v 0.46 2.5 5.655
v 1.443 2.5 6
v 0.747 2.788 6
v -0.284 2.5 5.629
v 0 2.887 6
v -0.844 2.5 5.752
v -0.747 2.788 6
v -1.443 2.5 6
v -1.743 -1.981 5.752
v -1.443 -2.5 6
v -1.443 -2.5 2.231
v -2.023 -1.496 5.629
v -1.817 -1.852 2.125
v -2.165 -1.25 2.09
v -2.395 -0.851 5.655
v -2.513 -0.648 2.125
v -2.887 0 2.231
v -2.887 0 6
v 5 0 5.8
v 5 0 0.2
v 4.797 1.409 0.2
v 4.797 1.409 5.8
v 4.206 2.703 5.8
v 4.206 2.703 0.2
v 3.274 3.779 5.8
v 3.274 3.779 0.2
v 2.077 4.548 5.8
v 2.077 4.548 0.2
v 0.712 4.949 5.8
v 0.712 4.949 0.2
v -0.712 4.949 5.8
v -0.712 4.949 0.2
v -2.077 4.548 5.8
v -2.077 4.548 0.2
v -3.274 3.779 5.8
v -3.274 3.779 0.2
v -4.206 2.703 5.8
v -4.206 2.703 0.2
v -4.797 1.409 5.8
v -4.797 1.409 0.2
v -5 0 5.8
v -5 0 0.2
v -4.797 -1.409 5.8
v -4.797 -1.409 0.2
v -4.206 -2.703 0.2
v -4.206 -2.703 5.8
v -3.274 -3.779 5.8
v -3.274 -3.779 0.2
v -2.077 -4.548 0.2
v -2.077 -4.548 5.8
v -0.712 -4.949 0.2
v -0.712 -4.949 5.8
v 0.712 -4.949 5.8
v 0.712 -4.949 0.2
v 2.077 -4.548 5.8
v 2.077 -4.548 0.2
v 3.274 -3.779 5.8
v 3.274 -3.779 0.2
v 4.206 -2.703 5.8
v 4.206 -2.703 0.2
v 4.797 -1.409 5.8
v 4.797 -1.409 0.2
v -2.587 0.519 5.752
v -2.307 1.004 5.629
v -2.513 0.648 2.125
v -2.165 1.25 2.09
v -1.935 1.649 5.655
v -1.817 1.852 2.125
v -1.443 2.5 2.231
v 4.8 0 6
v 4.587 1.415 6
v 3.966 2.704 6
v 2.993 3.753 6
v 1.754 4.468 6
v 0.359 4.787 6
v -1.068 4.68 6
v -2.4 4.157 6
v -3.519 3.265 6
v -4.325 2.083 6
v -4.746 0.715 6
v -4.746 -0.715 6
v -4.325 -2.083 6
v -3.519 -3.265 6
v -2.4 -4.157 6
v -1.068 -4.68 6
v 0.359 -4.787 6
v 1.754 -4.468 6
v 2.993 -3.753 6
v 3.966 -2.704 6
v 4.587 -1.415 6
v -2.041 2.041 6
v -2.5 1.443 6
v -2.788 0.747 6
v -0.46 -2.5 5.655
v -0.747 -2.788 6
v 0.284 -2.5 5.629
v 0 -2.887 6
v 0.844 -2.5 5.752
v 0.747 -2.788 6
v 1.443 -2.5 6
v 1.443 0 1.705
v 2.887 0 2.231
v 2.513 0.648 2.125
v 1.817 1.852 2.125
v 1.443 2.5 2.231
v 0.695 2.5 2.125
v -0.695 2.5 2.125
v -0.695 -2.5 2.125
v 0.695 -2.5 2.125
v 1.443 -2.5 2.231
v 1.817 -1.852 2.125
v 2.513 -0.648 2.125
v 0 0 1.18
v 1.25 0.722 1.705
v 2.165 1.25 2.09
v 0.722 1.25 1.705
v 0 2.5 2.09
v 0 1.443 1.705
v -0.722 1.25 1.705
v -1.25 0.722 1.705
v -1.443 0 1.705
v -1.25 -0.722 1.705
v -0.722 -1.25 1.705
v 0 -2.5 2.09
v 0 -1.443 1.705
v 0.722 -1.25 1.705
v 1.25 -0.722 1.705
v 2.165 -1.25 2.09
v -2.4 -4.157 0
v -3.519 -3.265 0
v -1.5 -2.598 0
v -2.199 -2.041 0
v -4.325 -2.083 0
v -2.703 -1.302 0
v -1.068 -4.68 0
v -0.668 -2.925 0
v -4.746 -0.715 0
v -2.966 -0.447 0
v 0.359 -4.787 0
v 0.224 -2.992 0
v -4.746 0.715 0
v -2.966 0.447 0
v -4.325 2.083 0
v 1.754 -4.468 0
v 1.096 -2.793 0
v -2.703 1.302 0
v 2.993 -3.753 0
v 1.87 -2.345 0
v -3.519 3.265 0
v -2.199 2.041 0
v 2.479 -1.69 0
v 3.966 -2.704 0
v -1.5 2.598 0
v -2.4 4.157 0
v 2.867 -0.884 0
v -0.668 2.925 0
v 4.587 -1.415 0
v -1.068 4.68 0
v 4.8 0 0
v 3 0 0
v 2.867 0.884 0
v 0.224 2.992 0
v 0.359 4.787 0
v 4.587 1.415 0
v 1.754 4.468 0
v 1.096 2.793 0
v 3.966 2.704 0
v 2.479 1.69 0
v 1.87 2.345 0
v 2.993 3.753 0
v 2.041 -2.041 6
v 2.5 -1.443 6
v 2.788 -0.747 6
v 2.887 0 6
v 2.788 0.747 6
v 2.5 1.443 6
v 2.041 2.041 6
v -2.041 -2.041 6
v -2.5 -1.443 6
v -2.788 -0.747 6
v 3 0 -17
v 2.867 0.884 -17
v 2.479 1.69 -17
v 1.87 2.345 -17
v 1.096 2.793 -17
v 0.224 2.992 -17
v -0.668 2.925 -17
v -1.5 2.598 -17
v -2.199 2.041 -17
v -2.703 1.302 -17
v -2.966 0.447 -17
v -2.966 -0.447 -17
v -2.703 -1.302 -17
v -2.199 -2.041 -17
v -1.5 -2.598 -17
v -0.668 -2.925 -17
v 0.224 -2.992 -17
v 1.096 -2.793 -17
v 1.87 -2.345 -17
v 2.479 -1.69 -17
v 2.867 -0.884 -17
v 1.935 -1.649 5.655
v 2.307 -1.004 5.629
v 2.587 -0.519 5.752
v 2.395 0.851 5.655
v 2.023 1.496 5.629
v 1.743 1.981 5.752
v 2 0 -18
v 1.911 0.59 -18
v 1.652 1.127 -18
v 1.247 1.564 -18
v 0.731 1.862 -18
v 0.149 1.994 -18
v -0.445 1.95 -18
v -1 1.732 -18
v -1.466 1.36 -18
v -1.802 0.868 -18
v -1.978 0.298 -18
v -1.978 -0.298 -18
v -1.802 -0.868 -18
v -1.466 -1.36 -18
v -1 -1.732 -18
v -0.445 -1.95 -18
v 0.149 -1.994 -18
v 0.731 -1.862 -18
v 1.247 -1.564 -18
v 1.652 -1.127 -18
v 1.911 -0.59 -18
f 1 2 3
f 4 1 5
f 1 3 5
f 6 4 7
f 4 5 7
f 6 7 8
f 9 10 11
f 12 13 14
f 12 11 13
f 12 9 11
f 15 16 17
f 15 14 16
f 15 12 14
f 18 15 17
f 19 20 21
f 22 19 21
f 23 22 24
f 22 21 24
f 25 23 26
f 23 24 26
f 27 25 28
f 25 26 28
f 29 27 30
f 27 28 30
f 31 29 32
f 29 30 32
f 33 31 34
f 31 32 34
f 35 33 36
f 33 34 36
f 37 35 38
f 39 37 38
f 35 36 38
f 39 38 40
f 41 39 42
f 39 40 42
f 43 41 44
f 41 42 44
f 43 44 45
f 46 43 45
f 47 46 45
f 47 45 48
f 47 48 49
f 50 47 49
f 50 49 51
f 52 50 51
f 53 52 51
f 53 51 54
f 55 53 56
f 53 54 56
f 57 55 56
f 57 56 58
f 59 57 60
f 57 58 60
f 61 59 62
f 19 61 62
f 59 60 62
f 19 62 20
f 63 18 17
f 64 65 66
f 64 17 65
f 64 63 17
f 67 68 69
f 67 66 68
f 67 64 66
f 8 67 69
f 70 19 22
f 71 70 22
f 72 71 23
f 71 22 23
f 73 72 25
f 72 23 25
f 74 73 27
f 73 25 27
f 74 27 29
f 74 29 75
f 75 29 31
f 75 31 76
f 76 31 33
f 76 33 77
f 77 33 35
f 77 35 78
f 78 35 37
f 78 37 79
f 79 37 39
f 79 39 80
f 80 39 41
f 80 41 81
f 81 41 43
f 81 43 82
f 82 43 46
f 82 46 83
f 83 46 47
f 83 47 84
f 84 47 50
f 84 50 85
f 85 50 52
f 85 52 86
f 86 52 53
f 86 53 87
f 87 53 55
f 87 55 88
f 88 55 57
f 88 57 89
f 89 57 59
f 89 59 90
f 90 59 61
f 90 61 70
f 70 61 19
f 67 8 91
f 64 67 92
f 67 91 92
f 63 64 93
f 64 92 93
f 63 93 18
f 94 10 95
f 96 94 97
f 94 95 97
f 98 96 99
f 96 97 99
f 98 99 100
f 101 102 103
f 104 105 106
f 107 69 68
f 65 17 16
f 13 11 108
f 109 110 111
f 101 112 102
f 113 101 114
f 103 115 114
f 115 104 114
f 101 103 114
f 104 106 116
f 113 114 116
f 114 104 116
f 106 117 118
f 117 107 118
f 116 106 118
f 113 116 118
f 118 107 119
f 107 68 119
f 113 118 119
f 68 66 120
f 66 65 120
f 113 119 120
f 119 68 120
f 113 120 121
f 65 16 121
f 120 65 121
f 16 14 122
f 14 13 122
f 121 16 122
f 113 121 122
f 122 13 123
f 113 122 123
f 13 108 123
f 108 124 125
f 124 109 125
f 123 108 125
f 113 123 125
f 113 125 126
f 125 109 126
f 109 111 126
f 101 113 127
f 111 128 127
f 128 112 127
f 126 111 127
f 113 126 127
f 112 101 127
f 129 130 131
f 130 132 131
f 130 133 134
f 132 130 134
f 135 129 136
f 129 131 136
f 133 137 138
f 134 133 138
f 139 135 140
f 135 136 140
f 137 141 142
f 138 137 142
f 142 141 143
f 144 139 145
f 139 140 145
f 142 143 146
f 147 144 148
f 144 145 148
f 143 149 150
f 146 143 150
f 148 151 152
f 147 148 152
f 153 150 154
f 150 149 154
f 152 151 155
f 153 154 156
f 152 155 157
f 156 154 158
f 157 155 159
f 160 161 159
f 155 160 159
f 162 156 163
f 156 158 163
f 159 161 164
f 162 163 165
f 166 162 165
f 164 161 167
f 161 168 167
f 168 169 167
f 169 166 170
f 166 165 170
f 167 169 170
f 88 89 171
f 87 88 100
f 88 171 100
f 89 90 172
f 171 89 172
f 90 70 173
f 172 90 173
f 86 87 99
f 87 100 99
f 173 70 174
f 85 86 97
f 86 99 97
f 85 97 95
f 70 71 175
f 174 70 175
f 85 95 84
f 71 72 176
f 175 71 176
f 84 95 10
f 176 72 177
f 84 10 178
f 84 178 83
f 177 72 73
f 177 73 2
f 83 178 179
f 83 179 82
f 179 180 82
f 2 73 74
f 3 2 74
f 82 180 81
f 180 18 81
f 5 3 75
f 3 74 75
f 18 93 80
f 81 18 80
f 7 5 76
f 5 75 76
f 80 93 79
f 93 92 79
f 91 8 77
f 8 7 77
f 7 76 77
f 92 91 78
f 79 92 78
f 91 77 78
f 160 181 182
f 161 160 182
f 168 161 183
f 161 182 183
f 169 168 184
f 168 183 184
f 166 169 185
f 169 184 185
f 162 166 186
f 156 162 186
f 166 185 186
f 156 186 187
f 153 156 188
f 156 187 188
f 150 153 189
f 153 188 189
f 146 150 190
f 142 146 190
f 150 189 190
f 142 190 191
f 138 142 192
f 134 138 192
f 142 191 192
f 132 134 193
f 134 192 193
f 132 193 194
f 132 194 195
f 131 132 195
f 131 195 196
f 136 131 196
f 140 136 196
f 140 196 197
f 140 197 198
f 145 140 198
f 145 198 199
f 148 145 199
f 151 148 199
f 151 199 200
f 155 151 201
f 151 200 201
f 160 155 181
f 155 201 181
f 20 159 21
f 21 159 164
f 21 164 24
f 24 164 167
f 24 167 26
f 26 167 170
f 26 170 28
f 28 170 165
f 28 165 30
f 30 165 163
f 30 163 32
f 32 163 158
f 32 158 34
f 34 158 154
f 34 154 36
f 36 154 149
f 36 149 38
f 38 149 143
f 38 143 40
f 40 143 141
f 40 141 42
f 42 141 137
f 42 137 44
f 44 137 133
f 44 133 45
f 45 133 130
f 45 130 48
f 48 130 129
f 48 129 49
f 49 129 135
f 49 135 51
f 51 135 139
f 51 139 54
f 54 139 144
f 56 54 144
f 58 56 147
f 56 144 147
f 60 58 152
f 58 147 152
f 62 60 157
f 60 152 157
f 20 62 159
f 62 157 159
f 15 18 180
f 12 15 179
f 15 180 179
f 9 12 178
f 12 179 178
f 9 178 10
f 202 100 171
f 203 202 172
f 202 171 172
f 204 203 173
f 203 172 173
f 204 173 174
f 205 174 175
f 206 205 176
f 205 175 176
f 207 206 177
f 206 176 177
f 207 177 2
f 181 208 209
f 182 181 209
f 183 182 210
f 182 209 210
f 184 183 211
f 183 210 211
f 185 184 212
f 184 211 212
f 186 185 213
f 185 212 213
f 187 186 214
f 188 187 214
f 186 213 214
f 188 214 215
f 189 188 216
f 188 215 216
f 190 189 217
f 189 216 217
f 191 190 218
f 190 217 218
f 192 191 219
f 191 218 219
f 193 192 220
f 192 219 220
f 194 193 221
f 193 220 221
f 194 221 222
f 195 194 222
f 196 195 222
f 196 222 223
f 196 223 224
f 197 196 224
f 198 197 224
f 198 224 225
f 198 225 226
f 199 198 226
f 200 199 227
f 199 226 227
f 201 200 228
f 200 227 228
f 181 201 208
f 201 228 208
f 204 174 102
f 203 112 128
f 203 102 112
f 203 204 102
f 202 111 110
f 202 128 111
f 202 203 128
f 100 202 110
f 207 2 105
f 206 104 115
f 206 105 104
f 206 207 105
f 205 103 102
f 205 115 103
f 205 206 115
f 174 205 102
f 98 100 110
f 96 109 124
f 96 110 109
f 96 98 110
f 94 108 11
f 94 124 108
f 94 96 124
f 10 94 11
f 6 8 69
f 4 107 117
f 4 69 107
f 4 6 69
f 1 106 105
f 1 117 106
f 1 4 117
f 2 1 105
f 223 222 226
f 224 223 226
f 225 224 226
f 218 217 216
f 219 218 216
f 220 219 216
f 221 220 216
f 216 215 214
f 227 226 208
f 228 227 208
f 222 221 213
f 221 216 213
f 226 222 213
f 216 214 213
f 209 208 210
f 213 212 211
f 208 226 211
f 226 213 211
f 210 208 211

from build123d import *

# Parameters (mm, degrees)
SKETCH001_R     = 6
POCKET_DEPTH    = 8.820854
CHAMFER_SIZE    = 0.2
CHAMFER001_SIZE = 1


with BuildPart() as pocket:
    # Sketch003 → Revolution001 (revolve)
    with BuildSketch(Plane.XZ):
        Polygon((0, 1.180146), (5, 3), (5, 10), (0, 10), align=None)
    revolve(axis=Axis((0, 0, 0), (0, 0, 1)))

    # Sketch001 (on Face3 of Revolution001) → Pocket (cut, through all)
    with BuildSketch(Plane(origin=(0, 0, 10), x_dir=(-1, 0, 0), z_dir=(0, 0, 1))):
        Circle(SKETCH001_R)
        Polygon((-1.443376, 2.5), (1.443376, 2.5), (2.886751, 0), (1.443376, -2.5), (-1.443376, -2.5), (-2.886751, 0), align=None, mode=Mode.SUBTRACT)
    extrude(amount=-POCKET_DEPTH, mode=Mode.SUBTRACT)


with BuildPart() as chamfer001:
    # Sketch → Revolution (revolve)
    with BuildSketch(Plane.XZ):
        Polygon((2.88675, 6), (5, 6), (5, 0), (3, 0), (3, -18), (0, -18), (0, 3.113247), align=None)
    revolve(axis=Axis((0, 0, 0), (0, 0, 1)))

    # Cut: cut Pocket
    add(pocket.part, mode=Mode.SUBTRACT)

    # Chamfer
    chamfer_edges = [chamfer001.edges().sort_by_distance(p)[0] for p in [
        (-5, 0, 6),
        (-5, 0, 0),
    ]]
    chamfer(chamfer_edges, length=CHAMFER_SIZE)

    # Chamfer001
    chamfer001_edges = [chamfer001.edges().sort_by_distance(p)[0] for p in [
        (-3, 0, -18),
    ]]
    chamfer(chamfer001_edges, length=CHAMFER001_SIZE)


solid = chamfer001.part
